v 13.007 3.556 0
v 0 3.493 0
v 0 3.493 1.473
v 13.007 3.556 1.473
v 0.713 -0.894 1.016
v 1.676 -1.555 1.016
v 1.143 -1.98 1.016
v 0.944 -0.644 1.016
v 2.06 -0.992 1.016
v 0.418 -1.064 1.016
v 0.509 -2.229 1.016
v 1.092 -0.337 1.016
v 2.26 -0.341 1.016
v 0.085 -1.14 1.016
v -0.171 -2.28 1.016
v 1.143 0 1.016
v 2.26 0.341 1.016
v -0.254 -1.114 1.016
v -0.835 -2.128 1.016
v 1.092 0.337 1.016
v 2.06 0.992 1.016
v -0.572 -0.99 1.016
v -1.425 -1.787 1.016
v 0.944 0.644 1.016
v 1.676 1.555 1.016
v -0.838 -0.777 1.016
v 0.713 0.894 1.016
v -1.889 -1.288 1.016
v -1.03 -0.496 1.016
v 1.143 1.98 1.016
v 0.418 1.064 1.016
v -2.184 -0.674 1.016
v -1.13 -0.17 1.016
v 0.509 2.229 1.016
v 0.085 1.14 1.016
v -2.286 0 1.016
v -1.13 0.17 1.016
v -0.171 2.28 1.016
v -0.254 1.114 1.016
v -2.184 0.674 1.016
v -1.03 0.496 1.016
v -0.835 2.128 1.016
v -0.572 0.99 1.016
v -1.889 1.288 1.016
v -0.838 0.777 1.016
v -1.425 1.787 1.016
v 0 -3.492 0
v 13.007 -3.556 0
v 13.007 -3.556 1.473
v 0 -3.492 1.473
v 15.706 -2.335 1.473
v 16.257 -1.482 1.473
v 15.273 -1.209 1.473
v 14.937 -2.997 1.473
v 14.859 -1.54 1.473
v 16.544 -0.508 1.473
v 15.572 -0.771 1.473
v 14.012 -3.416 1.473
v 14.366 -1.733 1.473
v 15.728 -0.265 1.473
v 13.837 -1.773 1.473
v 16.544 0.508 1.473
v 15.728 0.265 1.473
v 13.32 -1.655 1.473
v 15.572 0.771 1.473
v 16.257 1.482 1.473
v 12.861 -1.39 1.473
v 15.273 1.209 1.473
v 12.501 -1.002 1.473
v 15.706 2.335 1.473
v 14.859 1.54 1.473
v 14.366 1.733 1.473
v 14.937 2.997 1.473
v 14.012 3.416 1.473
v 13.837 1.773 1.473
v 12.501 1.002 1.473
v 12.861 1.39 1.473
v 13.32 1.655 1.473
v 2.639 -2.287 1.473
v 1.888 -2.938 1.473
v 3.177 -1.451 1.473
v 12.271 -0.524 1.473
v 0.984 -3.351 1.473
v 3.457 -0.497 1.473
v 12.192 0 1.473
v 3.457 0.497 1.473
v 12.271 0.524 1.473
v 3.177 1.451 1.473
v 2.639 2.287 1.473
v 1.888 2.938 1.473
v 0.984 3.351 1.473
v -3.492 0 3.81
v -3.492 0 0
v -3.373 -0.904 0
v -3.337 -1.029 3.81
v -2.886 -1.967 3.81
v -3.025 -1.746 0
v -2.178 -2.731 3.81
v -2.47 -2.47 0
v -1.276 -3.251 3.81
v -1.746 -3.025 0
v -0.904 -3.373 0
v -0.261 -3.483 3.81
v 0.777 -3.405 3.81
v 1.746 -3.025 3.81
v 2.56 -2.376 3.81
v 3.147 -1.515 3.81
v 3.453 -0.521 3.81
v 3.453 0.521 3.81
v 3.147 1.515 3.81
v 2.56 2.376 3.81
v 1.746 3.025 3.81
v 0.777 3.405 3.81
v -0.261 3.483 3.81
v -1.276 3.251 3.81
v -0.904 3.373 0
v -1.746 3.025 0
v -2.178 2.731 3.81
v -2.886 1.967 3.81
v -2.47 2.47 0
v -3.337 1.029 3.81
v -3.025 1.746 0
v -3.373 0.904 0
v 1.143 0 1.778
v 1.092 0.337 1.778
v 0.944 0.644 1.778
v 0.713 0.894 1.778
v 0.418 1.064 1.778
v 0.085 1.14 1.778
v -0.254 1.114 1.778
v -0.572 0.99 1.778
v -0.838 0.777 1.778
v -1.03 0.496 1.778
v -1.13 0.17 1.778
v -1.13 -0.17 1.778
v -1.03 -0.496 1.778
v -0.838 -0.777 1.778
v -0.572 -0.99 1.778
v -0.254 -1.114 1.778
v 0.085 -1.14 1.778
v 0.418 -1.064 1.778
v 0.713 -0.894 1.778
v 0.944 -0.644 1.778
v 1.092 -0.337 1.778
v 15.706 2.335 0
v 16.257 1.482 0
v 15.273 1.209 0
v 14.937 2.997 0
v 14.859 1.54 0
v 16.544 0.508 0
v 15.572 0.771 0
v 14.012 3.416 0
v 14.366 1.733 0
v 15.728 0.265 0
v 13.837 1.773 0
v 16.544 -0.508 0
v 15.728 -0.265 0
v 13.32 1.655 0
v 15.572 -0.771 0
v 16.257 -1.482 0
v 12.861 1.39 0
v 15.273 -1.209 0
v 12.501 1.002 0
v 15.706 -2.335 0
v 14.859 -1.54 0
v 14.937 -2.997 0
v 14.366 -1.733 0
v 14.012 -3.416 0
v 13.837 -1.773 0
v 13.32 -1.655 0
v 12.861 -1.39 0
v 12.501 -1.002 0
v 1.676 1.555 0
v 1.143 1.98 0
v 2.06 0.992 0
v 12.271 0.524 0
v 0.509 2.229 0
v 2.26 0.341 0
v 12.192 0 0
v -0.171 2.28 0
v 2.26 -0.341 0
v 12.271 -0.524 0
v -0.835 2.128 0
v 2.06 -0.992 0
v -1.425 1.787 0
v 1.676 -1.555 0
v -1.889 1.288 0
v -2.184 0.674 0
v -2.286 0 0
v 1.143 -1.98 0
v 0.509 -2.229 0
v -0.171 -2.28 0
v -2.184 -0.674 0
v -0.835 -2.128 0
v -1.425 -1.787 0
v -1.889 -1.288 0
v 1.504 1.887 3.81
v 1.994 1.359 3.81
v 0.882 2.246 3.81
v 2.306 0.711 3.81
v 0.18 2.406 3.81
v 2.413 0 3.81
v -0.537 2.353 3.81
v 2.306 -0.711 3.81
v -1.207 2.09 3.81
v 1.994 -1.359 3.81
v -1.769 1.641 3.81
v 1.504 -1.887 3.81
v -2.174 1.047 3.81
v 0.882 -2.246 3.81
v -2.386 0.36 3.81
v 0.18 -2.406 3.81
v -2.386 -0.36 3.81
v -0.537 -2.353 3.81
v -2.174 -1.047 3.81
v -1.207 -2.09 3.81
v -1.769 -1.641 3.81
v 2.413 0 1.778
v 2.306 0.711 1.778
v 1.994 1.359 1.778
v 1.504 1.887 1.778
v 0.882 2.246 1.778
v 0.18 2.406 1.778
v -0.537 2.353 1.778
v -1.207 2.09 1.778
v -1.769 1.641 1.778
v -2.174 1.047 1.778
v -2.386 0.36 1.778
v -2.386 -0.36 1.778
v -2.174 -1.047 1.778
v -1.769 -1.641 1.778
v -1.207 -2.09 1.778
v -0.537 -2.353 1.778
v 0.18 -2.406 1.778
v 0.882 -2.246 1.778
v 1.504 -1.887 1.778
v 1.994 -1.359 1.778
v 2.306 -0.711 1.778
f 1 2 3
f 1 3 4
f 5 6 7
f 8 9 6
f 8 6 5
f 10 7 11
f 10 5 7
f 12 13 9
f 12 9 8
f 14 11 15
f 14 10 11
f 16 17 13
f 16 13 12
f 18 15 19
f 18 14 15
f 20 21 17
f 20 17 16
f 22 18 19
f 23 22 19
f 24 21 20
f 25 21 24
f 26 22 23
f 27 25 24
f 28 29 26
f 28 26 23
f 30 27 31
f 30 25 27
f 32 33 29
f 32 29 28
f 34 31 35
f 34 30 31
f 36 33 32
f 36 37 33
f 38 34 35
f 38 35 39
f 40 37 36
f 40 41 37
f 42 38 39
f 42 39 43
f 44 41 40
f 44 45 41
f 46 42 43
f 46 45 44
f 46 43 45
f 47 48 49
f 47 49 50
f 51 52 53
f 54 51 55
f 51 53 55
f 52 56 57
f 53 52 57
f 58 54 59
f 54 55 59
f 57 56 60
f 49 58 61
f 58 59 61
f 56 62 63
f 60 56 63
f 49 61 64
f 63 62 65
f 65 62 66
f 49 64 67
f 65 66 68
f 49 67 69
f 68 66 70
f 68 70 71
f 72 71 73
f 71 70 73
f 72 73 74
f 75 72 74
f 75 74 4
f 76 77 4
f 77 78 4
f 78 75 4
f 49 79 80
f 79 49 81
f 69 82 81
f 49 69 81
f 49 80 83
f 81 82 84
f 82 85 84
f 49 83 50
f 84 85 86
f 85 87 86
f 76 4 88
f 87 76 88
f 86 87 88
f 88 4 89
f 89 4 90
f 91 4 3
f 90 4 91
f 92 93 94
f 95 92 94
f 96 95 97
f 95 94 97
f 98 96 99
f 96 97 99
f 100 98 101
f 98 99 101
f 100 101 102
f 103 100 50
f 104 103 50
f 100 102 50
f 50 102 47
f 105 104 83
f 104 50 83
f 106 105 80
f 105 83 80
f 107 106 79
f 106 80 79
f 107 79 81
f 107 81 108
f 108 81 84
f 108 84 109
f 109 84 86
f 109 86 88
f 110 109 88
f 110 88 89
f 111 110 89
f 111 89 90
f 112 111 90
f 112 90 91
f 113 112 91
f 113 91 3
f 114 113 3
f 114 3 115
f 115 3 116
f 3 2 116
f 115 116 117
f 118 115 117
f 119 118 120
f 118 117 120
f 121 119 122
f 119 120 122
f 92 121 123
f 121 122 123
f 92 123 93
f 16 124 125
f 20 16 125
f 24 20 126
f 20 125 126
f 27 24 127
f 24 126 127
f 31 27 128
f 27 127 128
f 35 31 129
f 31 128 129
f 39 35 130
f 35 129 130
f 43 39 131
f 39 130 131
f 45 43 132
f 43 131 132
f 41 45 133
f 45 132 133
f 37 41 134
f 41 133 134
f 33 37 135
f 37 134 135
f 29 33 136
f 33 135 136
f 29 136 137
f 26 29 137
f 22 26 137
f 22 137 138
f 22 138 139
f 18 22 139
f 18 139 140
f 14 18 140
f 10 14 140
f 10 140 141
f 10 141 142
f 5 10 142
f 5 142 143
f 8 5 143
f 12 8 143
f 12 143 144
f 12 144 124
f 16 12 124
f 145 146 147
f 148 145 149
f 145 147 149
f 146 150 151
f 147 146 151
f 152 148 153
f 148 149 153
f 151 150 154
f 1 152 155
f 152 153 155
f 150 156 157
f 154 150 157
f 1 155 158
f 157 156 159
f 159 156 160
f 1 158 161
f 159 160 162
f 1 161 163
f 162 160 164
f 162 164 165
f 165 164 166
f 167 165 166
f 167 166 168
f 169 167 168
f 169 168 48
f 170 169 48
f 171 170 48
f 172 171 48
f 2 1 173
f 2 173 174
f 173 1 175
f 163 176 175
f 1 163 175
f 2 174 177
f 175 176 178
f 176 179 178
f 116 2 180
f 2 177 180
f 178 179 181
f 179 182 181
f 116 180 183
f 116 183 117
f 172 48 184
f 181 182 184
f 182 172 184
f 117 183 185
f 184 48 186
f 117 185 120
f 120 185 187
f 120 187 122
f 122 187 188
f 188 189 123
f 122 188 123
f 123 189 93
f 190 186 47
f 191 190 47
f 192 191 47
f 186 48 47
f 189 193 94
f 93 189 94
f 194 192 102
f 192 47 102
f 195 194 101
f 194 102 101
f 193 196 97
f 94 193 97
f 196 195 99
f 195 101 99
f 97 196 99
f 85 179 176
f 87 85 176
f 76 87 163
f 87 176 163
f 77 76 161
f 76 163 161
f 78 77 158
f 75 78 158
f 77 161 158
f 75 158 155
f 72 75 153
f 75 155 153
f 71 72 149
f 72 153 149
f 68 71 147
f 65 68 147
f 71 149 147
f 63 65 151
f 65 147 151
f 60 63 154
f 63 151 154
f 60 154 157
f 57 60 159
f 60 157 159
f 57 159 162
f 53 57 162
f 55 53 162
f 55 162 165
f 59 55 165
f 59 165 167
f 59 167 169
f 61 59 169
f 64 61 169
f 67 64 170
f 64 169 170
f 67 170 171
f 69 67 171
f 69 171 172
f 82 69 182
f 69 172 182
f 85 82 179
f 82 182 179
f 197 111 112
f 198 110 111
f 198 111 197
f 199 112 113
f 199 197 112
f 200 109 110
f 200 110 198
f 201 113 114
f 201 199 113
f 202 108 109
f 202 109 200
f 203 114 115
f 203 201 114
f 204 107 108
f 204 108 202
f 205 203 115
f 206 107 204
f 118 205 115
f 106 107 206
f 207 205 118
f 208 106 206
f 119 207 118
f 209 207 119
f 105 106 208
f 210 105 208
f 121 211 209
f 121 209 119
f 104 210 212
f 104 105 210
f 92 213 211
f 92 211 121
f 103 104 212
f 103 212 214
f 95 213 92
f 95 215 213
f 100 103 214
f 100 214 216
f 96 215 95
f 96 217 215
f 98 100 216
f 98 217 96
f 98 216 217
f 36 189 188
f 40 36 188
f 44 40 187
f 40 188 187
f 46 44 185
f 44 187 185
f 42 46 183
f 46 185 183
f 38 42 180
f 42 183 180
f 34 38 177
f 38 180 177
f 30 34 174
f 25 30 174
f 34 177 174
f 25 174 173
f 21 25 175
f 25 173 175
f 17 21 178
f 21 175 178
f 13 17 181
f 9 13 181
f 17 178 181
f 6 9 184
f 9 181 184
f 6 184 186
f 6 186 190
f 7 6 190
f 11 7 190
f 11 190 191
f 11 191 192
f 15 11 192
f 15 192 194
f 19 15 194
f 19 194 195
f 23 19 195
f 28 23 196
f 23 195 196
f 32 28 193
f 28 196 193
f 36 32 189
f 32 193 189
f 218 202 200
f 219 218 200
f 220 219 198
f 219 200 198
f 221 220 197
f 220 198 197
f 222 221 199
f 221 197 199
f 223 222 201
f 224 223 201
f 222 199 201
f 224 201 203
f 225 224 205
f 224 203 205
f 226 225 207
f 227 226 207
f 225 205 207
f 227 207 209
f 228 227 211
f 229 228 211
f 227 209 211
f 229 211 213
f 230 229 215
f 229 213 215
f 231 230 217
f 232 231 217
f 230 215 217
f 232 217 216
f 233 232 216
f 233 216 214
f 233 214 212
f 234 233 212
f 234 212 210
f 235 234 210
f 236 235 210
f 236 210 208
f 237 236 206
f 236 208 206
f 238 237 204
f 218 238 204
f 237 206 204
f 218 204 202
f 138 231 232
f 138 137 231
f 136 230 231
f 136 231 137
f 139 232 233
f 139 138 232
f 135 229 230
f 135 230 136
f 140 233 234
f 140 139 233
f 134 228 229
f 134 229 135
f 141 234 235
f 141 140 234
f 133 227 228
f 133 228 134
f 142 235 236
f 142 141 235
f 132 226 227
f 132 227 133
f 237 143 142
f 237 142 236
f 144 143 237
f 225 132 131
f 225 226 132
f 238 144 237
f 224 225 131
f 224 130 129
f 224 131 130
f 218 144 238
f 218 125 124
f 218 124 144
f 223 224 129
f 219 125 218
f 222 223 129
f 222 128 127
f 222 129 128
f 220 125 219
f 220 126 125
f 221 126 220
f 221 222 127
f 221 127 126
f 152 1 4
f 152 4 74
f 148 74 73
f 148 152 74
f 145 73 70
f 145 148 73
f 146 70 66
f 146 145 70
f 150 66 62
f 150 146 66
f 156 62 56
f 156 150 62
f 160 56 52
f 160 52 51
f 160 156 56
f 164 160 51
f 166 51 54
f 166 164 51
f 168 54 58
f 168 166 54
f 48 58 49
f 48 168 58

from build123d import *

# Parameters (mm, degrees)
SKETCH2_R           = 3.4925
BOSS_EXTRUDE1_DEPTH = 3.81
SKETCH3_R           = 2.413
CUT_EXTRUDE1_DEPTH  = 2.032
SKETCH4_R           = 1.143
CUT_EXTRUDE2_DEPTH  = 2.2225
SKETCH5_R           = 2.286
CUT_EXTRUDE3_DEPTH  = 1.016
SKETCH6_R           = 1.778
BOSS_EXTRUDE2_DEPTH = 1.4732


with BuildPart() as part:
    # Sketch2 → Boss-Extrude1 (new body)
    with BuildSketch(Plane.XY):
        with Locations(Location((0, 0, 0), (0, 0, 180))):
            Circle(SKETCH2_R)
    extrude(amount=BOSS_EXTRUDE1_DEPTH)

    # Sketch3 → Cut-Extrude1 (cut)
    with BuildSketch(Plane.XY.offset(3.81)):
        Circle(SKETCH3_R)
    extrude(amount=-CUT_EXTRUDE1_DEPTH, mode=Mode.SUBTRACT)

    # Sketch4 → Cut-Extrude2 (cut)
    with BuildSketch(Plane.XY.offset(1.778)):
        Circle(SKETCH4_R)
    extrude(amount=-CUT_EXTRUDE2_DEPTH, mode=Mode.SUBTRACT)

    # Sketch5 → Cut-Extrude3 (cut)
    with BuildSketch(Plane(origin=(0, 0, 0), x_dir=(-1, 0, 0), z_dir=(0, 0, -1))):
        Circle(SKETCH5_R)
    extrude(amount=-CUT_EXTRUDE3_DEPTH, mode=Mode.SUBTRACT)

    # Sketch6 → Boss-Extrude2 (add)
    with BuildSketch(Plane(origin=(0, 0, 0), x_dir=(-1, 0, 0), z_dir=(0, 0, -1))):
        with BuildLine():
            Line((0, 3.4925), (-13.006826988, 3.55595768))
            ThreePointArc((-13.006826988, 3.55595768), (-16.580175786, 0), (-13.006826988, -3.55595768))
            Line((-13.006826988, -3.55595768), (0, -3.4925))
            ThreePointArc((0, -3.4925), (-3.4925, 0), (0, 3.4925))
        make_face()
        with Locations((-13.97, 0)):
            Circle(SKETCH6_R, mode=Mode.SUBTRACT)
    extrude(amount=-BOSS_EXTRUDE2_DEPTH)


solid = part.part
